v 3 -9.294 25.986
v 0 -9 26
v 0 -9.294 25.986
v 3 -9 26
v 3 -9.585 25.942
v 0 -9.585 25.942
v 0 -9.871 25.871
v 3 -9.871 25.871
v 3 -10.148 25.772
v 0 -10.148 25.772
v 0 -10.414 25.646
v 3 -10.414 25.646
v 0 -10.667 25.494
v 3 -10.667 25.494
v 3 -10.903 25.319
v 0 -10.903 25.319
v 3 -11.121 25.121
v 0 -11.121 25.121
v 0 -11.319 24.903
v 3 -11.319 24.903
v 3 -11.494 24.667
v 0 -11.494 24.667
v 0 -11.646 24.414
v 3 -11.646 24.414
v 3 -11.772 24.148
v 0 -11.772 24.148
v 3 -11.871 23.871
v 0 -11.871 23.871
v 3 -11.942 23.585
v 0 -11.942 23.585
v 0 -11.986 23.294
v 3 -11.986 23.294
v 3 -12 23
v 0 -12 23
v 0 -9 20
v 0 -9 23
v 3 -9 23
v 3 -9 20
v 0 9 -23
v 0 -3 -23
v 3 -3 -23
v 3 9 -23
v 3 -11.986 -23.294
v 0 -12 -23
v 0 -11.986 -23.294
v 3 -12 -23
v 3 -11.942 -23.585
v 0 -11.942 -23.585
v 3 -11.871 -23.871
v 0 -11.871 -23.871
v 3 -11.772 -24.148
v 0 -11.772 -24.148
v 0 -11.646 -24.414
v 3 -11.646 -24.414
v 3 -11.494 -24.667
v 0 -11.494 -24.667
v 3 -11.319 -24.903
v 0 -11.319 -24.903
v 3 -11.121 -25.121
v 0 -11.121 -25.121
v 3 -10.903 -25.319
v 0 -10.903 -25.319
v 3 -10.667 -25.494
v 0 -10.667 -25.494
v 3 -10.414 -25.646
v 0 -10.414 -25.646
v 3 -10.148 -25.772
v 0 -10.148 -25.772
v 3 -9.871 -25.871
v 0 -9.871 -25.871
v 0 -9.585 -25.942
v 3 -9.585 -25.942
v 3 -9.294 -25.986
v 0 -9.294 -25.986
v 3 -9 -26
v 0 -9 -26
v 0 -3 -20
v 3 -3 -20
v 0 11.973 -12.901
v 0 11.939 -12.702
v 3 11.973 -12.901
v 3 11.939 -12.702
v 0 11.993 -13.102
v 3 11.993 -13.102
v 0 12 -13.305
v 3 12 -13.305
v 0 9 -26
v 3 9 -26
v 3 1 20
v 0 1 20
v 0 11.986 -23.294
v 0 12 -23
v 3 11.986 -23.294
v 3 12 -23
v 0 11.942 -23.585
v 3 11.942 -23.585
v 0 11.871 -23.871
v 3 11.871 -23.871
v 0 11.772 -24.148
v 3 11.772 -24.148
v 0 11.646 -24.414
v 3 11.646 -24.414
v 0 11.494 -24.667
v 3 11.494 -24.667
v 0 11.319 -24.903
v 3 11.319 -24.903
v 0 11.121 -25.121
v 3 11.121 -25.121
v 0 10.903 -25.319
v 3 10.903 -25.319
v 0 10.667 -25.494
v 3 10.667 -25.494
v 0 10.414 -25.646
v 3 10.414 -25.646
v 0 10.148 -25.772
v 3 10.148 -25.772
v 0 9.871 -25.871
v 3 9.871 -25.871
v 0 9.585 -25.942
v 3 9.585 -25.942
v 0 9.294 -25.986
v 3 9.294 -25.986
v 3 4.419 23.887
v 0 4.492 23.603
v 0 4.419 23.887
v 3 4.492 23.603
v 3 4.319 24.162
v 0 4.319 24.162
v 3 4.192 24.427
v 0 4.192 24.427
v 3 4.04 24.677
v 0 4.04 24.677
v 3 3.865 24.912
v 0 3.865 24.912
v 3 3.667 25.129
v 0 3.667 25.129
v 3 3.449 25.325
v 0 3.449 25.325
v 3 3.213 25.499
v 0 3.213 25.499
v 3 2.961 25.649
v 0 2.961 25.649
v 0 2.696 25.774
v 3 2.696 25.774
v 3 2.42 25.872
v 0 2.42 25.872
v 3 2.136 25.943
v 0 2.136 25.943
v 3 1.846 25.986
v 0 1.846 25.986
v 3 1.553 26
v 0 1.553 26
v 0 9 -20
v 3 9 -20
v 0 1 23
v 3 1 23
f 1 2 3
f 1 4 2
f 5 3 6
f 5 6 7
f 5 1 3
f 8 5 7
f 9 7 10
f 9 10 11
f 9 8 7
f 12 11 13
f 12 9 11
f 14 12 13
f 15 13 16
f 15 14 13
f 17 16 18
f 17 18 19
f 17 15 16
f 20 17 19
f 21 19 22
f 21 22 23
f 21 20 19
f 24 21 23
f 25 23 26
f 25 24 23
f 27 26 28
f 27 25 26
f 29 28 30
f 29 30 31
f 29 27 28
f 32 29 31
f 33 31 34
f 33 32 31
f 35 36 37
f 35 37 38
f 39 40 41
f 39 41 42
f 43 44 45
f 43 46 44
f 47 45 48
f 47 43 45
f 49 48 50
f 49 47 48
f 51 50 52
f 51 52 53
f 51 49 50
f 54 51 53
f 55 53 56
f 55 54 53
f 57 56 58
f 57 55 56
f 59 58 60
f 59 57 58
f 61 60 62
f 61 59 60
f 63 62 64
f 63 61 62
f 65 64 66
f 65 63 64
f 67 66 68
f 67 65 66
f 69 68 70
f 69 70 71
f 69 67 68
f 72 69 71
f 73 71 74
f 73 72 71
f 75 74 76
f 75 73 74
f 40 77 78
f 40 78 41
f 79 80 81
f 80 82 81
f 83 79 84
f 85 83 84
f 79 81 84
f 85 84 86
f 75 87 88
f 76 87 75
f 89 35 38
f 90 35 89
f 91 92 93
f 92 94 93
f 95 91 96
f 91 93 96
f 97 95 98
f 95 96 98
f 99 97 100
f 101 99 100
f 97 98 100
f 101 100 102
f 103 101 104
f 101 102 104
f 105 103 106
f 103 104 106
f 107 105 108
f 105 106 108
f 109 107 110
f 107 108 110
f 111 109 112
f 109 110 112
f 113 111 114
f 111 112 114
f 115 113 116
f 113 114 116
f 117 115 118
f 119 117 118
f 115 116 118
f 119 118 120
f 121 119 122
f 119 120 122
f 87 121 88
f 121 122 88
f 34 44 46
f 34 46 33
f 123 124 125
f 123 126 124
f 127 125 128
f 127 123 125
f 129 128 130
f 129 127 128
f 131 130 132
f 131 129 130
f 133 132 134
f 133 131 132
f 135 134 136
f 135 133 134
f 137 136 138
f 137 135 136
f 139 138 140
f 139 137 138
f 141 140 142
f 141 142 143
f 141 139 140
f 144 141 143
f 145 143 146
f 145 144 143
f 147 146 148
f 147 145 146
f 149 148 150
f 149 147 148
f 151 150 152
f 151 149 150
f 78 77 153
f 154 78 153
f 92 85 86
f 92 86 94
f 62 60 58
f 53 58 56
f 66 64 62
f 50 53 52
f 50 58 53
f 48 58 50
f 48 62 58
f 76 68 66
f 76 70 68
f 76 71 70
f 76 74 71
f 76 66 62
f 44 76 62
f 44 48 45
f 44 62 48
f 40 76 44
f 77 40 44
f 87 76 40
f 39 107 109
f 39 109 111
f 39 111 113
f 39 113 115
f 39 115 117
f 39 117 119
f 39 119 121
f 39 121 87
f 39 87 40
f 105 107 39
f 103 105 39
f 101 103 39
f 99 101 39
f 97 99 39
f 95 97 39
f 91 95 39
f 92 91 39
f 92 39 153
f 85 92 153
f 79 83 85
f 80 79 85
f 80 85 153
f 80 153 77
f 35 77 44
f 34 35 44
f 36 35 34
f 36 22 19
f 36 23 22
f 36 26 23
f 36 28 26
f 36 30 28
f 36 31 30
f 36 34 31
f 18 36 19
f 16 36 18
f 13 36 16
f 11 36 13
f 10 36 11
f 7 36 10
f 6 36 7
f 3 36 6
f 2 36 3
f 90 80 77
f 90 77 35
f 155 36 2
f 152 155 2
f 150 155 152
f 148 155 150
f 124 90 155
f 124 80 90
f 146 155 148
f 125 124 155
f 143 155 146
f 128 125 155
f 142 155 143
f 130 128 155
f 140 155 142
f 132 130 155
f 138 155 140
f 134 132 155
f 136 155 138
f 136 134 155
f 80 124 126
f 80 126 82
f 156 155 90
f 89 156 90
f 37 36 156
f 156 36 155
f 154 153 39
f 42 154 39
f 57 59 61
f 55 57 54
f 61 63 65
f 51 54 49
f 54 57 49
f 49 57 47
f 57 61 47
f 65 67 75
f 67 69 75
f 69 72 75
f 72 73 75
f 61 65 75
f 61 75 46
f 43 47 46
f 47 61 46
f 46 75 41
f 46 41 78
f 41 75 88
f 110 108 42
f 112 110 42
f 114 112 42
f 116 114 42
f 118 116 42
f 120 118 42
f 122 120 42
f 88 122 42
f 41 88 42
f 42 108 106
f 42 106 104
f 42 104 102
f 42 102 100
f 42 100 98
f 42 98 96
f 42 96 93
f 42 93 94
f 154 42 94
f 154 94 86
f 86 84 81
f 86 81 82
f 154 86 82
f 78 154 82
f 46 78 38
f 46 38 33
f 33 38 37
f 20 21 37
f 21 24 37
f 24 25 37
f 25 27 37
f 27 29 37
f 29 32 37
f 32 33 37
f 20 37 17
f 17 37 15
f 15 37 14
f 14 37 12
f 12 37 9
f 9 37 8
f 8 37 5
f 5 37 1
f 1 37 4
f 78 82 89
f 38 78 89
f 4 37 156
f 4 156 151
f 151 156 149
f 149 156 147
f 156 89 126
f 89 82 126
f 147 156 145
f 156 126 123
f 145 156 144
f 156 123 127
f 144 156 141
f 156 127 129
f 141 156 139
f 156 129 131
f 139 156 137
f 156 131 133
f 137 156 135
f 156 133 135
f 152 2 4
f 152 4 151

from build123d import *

# Parameters (mm, degrees)
SKETCH_1_W      = 3
SKETCH_1_H      = 10
SKETCH_1_H_2    = 12
EXTRUDE_1_DEPTH = 3
FILLET_1_R      = 3


with BuildPart() as part:
    # Эскиз1 → Бобышка-Вытянуть1 (new body)
    with BuildSketch(Plane(origin=(0, 0, 0), x_dir=(0, 0, -1), z_dir=(1, 0, 0))):
        Polygon((-26, 4), (13, 12), (26, 12), (26, -12), (-26, -12), align=None)
        with Locations((-21.5, -4)):
            Rectangle(SKETCH_1_W, SKETCH_1_H, mode=Mode.SUBTRACT)
        with Locations((21.5, 3)):
            Rectangle(SKETCH_1_W, SKETCH_1_H_2, mode=Mode.SUBTRACT)
    extrude(amount=EXTRUDE_1_DEPTH)

    # Скругление1
    fillet_1_edges = [part.edges().sort_by_distance(p)[0] for p in [
        (1.5, 4, 26),
        (1.5, 12, -13),
        (1.5, 12, -26),
        (1.5, -12, -26),
        (1.5, -12, 26),
    ]]
    fillet(fillet_1_edges, radius=FILLET_1_R)


solid = part.part
